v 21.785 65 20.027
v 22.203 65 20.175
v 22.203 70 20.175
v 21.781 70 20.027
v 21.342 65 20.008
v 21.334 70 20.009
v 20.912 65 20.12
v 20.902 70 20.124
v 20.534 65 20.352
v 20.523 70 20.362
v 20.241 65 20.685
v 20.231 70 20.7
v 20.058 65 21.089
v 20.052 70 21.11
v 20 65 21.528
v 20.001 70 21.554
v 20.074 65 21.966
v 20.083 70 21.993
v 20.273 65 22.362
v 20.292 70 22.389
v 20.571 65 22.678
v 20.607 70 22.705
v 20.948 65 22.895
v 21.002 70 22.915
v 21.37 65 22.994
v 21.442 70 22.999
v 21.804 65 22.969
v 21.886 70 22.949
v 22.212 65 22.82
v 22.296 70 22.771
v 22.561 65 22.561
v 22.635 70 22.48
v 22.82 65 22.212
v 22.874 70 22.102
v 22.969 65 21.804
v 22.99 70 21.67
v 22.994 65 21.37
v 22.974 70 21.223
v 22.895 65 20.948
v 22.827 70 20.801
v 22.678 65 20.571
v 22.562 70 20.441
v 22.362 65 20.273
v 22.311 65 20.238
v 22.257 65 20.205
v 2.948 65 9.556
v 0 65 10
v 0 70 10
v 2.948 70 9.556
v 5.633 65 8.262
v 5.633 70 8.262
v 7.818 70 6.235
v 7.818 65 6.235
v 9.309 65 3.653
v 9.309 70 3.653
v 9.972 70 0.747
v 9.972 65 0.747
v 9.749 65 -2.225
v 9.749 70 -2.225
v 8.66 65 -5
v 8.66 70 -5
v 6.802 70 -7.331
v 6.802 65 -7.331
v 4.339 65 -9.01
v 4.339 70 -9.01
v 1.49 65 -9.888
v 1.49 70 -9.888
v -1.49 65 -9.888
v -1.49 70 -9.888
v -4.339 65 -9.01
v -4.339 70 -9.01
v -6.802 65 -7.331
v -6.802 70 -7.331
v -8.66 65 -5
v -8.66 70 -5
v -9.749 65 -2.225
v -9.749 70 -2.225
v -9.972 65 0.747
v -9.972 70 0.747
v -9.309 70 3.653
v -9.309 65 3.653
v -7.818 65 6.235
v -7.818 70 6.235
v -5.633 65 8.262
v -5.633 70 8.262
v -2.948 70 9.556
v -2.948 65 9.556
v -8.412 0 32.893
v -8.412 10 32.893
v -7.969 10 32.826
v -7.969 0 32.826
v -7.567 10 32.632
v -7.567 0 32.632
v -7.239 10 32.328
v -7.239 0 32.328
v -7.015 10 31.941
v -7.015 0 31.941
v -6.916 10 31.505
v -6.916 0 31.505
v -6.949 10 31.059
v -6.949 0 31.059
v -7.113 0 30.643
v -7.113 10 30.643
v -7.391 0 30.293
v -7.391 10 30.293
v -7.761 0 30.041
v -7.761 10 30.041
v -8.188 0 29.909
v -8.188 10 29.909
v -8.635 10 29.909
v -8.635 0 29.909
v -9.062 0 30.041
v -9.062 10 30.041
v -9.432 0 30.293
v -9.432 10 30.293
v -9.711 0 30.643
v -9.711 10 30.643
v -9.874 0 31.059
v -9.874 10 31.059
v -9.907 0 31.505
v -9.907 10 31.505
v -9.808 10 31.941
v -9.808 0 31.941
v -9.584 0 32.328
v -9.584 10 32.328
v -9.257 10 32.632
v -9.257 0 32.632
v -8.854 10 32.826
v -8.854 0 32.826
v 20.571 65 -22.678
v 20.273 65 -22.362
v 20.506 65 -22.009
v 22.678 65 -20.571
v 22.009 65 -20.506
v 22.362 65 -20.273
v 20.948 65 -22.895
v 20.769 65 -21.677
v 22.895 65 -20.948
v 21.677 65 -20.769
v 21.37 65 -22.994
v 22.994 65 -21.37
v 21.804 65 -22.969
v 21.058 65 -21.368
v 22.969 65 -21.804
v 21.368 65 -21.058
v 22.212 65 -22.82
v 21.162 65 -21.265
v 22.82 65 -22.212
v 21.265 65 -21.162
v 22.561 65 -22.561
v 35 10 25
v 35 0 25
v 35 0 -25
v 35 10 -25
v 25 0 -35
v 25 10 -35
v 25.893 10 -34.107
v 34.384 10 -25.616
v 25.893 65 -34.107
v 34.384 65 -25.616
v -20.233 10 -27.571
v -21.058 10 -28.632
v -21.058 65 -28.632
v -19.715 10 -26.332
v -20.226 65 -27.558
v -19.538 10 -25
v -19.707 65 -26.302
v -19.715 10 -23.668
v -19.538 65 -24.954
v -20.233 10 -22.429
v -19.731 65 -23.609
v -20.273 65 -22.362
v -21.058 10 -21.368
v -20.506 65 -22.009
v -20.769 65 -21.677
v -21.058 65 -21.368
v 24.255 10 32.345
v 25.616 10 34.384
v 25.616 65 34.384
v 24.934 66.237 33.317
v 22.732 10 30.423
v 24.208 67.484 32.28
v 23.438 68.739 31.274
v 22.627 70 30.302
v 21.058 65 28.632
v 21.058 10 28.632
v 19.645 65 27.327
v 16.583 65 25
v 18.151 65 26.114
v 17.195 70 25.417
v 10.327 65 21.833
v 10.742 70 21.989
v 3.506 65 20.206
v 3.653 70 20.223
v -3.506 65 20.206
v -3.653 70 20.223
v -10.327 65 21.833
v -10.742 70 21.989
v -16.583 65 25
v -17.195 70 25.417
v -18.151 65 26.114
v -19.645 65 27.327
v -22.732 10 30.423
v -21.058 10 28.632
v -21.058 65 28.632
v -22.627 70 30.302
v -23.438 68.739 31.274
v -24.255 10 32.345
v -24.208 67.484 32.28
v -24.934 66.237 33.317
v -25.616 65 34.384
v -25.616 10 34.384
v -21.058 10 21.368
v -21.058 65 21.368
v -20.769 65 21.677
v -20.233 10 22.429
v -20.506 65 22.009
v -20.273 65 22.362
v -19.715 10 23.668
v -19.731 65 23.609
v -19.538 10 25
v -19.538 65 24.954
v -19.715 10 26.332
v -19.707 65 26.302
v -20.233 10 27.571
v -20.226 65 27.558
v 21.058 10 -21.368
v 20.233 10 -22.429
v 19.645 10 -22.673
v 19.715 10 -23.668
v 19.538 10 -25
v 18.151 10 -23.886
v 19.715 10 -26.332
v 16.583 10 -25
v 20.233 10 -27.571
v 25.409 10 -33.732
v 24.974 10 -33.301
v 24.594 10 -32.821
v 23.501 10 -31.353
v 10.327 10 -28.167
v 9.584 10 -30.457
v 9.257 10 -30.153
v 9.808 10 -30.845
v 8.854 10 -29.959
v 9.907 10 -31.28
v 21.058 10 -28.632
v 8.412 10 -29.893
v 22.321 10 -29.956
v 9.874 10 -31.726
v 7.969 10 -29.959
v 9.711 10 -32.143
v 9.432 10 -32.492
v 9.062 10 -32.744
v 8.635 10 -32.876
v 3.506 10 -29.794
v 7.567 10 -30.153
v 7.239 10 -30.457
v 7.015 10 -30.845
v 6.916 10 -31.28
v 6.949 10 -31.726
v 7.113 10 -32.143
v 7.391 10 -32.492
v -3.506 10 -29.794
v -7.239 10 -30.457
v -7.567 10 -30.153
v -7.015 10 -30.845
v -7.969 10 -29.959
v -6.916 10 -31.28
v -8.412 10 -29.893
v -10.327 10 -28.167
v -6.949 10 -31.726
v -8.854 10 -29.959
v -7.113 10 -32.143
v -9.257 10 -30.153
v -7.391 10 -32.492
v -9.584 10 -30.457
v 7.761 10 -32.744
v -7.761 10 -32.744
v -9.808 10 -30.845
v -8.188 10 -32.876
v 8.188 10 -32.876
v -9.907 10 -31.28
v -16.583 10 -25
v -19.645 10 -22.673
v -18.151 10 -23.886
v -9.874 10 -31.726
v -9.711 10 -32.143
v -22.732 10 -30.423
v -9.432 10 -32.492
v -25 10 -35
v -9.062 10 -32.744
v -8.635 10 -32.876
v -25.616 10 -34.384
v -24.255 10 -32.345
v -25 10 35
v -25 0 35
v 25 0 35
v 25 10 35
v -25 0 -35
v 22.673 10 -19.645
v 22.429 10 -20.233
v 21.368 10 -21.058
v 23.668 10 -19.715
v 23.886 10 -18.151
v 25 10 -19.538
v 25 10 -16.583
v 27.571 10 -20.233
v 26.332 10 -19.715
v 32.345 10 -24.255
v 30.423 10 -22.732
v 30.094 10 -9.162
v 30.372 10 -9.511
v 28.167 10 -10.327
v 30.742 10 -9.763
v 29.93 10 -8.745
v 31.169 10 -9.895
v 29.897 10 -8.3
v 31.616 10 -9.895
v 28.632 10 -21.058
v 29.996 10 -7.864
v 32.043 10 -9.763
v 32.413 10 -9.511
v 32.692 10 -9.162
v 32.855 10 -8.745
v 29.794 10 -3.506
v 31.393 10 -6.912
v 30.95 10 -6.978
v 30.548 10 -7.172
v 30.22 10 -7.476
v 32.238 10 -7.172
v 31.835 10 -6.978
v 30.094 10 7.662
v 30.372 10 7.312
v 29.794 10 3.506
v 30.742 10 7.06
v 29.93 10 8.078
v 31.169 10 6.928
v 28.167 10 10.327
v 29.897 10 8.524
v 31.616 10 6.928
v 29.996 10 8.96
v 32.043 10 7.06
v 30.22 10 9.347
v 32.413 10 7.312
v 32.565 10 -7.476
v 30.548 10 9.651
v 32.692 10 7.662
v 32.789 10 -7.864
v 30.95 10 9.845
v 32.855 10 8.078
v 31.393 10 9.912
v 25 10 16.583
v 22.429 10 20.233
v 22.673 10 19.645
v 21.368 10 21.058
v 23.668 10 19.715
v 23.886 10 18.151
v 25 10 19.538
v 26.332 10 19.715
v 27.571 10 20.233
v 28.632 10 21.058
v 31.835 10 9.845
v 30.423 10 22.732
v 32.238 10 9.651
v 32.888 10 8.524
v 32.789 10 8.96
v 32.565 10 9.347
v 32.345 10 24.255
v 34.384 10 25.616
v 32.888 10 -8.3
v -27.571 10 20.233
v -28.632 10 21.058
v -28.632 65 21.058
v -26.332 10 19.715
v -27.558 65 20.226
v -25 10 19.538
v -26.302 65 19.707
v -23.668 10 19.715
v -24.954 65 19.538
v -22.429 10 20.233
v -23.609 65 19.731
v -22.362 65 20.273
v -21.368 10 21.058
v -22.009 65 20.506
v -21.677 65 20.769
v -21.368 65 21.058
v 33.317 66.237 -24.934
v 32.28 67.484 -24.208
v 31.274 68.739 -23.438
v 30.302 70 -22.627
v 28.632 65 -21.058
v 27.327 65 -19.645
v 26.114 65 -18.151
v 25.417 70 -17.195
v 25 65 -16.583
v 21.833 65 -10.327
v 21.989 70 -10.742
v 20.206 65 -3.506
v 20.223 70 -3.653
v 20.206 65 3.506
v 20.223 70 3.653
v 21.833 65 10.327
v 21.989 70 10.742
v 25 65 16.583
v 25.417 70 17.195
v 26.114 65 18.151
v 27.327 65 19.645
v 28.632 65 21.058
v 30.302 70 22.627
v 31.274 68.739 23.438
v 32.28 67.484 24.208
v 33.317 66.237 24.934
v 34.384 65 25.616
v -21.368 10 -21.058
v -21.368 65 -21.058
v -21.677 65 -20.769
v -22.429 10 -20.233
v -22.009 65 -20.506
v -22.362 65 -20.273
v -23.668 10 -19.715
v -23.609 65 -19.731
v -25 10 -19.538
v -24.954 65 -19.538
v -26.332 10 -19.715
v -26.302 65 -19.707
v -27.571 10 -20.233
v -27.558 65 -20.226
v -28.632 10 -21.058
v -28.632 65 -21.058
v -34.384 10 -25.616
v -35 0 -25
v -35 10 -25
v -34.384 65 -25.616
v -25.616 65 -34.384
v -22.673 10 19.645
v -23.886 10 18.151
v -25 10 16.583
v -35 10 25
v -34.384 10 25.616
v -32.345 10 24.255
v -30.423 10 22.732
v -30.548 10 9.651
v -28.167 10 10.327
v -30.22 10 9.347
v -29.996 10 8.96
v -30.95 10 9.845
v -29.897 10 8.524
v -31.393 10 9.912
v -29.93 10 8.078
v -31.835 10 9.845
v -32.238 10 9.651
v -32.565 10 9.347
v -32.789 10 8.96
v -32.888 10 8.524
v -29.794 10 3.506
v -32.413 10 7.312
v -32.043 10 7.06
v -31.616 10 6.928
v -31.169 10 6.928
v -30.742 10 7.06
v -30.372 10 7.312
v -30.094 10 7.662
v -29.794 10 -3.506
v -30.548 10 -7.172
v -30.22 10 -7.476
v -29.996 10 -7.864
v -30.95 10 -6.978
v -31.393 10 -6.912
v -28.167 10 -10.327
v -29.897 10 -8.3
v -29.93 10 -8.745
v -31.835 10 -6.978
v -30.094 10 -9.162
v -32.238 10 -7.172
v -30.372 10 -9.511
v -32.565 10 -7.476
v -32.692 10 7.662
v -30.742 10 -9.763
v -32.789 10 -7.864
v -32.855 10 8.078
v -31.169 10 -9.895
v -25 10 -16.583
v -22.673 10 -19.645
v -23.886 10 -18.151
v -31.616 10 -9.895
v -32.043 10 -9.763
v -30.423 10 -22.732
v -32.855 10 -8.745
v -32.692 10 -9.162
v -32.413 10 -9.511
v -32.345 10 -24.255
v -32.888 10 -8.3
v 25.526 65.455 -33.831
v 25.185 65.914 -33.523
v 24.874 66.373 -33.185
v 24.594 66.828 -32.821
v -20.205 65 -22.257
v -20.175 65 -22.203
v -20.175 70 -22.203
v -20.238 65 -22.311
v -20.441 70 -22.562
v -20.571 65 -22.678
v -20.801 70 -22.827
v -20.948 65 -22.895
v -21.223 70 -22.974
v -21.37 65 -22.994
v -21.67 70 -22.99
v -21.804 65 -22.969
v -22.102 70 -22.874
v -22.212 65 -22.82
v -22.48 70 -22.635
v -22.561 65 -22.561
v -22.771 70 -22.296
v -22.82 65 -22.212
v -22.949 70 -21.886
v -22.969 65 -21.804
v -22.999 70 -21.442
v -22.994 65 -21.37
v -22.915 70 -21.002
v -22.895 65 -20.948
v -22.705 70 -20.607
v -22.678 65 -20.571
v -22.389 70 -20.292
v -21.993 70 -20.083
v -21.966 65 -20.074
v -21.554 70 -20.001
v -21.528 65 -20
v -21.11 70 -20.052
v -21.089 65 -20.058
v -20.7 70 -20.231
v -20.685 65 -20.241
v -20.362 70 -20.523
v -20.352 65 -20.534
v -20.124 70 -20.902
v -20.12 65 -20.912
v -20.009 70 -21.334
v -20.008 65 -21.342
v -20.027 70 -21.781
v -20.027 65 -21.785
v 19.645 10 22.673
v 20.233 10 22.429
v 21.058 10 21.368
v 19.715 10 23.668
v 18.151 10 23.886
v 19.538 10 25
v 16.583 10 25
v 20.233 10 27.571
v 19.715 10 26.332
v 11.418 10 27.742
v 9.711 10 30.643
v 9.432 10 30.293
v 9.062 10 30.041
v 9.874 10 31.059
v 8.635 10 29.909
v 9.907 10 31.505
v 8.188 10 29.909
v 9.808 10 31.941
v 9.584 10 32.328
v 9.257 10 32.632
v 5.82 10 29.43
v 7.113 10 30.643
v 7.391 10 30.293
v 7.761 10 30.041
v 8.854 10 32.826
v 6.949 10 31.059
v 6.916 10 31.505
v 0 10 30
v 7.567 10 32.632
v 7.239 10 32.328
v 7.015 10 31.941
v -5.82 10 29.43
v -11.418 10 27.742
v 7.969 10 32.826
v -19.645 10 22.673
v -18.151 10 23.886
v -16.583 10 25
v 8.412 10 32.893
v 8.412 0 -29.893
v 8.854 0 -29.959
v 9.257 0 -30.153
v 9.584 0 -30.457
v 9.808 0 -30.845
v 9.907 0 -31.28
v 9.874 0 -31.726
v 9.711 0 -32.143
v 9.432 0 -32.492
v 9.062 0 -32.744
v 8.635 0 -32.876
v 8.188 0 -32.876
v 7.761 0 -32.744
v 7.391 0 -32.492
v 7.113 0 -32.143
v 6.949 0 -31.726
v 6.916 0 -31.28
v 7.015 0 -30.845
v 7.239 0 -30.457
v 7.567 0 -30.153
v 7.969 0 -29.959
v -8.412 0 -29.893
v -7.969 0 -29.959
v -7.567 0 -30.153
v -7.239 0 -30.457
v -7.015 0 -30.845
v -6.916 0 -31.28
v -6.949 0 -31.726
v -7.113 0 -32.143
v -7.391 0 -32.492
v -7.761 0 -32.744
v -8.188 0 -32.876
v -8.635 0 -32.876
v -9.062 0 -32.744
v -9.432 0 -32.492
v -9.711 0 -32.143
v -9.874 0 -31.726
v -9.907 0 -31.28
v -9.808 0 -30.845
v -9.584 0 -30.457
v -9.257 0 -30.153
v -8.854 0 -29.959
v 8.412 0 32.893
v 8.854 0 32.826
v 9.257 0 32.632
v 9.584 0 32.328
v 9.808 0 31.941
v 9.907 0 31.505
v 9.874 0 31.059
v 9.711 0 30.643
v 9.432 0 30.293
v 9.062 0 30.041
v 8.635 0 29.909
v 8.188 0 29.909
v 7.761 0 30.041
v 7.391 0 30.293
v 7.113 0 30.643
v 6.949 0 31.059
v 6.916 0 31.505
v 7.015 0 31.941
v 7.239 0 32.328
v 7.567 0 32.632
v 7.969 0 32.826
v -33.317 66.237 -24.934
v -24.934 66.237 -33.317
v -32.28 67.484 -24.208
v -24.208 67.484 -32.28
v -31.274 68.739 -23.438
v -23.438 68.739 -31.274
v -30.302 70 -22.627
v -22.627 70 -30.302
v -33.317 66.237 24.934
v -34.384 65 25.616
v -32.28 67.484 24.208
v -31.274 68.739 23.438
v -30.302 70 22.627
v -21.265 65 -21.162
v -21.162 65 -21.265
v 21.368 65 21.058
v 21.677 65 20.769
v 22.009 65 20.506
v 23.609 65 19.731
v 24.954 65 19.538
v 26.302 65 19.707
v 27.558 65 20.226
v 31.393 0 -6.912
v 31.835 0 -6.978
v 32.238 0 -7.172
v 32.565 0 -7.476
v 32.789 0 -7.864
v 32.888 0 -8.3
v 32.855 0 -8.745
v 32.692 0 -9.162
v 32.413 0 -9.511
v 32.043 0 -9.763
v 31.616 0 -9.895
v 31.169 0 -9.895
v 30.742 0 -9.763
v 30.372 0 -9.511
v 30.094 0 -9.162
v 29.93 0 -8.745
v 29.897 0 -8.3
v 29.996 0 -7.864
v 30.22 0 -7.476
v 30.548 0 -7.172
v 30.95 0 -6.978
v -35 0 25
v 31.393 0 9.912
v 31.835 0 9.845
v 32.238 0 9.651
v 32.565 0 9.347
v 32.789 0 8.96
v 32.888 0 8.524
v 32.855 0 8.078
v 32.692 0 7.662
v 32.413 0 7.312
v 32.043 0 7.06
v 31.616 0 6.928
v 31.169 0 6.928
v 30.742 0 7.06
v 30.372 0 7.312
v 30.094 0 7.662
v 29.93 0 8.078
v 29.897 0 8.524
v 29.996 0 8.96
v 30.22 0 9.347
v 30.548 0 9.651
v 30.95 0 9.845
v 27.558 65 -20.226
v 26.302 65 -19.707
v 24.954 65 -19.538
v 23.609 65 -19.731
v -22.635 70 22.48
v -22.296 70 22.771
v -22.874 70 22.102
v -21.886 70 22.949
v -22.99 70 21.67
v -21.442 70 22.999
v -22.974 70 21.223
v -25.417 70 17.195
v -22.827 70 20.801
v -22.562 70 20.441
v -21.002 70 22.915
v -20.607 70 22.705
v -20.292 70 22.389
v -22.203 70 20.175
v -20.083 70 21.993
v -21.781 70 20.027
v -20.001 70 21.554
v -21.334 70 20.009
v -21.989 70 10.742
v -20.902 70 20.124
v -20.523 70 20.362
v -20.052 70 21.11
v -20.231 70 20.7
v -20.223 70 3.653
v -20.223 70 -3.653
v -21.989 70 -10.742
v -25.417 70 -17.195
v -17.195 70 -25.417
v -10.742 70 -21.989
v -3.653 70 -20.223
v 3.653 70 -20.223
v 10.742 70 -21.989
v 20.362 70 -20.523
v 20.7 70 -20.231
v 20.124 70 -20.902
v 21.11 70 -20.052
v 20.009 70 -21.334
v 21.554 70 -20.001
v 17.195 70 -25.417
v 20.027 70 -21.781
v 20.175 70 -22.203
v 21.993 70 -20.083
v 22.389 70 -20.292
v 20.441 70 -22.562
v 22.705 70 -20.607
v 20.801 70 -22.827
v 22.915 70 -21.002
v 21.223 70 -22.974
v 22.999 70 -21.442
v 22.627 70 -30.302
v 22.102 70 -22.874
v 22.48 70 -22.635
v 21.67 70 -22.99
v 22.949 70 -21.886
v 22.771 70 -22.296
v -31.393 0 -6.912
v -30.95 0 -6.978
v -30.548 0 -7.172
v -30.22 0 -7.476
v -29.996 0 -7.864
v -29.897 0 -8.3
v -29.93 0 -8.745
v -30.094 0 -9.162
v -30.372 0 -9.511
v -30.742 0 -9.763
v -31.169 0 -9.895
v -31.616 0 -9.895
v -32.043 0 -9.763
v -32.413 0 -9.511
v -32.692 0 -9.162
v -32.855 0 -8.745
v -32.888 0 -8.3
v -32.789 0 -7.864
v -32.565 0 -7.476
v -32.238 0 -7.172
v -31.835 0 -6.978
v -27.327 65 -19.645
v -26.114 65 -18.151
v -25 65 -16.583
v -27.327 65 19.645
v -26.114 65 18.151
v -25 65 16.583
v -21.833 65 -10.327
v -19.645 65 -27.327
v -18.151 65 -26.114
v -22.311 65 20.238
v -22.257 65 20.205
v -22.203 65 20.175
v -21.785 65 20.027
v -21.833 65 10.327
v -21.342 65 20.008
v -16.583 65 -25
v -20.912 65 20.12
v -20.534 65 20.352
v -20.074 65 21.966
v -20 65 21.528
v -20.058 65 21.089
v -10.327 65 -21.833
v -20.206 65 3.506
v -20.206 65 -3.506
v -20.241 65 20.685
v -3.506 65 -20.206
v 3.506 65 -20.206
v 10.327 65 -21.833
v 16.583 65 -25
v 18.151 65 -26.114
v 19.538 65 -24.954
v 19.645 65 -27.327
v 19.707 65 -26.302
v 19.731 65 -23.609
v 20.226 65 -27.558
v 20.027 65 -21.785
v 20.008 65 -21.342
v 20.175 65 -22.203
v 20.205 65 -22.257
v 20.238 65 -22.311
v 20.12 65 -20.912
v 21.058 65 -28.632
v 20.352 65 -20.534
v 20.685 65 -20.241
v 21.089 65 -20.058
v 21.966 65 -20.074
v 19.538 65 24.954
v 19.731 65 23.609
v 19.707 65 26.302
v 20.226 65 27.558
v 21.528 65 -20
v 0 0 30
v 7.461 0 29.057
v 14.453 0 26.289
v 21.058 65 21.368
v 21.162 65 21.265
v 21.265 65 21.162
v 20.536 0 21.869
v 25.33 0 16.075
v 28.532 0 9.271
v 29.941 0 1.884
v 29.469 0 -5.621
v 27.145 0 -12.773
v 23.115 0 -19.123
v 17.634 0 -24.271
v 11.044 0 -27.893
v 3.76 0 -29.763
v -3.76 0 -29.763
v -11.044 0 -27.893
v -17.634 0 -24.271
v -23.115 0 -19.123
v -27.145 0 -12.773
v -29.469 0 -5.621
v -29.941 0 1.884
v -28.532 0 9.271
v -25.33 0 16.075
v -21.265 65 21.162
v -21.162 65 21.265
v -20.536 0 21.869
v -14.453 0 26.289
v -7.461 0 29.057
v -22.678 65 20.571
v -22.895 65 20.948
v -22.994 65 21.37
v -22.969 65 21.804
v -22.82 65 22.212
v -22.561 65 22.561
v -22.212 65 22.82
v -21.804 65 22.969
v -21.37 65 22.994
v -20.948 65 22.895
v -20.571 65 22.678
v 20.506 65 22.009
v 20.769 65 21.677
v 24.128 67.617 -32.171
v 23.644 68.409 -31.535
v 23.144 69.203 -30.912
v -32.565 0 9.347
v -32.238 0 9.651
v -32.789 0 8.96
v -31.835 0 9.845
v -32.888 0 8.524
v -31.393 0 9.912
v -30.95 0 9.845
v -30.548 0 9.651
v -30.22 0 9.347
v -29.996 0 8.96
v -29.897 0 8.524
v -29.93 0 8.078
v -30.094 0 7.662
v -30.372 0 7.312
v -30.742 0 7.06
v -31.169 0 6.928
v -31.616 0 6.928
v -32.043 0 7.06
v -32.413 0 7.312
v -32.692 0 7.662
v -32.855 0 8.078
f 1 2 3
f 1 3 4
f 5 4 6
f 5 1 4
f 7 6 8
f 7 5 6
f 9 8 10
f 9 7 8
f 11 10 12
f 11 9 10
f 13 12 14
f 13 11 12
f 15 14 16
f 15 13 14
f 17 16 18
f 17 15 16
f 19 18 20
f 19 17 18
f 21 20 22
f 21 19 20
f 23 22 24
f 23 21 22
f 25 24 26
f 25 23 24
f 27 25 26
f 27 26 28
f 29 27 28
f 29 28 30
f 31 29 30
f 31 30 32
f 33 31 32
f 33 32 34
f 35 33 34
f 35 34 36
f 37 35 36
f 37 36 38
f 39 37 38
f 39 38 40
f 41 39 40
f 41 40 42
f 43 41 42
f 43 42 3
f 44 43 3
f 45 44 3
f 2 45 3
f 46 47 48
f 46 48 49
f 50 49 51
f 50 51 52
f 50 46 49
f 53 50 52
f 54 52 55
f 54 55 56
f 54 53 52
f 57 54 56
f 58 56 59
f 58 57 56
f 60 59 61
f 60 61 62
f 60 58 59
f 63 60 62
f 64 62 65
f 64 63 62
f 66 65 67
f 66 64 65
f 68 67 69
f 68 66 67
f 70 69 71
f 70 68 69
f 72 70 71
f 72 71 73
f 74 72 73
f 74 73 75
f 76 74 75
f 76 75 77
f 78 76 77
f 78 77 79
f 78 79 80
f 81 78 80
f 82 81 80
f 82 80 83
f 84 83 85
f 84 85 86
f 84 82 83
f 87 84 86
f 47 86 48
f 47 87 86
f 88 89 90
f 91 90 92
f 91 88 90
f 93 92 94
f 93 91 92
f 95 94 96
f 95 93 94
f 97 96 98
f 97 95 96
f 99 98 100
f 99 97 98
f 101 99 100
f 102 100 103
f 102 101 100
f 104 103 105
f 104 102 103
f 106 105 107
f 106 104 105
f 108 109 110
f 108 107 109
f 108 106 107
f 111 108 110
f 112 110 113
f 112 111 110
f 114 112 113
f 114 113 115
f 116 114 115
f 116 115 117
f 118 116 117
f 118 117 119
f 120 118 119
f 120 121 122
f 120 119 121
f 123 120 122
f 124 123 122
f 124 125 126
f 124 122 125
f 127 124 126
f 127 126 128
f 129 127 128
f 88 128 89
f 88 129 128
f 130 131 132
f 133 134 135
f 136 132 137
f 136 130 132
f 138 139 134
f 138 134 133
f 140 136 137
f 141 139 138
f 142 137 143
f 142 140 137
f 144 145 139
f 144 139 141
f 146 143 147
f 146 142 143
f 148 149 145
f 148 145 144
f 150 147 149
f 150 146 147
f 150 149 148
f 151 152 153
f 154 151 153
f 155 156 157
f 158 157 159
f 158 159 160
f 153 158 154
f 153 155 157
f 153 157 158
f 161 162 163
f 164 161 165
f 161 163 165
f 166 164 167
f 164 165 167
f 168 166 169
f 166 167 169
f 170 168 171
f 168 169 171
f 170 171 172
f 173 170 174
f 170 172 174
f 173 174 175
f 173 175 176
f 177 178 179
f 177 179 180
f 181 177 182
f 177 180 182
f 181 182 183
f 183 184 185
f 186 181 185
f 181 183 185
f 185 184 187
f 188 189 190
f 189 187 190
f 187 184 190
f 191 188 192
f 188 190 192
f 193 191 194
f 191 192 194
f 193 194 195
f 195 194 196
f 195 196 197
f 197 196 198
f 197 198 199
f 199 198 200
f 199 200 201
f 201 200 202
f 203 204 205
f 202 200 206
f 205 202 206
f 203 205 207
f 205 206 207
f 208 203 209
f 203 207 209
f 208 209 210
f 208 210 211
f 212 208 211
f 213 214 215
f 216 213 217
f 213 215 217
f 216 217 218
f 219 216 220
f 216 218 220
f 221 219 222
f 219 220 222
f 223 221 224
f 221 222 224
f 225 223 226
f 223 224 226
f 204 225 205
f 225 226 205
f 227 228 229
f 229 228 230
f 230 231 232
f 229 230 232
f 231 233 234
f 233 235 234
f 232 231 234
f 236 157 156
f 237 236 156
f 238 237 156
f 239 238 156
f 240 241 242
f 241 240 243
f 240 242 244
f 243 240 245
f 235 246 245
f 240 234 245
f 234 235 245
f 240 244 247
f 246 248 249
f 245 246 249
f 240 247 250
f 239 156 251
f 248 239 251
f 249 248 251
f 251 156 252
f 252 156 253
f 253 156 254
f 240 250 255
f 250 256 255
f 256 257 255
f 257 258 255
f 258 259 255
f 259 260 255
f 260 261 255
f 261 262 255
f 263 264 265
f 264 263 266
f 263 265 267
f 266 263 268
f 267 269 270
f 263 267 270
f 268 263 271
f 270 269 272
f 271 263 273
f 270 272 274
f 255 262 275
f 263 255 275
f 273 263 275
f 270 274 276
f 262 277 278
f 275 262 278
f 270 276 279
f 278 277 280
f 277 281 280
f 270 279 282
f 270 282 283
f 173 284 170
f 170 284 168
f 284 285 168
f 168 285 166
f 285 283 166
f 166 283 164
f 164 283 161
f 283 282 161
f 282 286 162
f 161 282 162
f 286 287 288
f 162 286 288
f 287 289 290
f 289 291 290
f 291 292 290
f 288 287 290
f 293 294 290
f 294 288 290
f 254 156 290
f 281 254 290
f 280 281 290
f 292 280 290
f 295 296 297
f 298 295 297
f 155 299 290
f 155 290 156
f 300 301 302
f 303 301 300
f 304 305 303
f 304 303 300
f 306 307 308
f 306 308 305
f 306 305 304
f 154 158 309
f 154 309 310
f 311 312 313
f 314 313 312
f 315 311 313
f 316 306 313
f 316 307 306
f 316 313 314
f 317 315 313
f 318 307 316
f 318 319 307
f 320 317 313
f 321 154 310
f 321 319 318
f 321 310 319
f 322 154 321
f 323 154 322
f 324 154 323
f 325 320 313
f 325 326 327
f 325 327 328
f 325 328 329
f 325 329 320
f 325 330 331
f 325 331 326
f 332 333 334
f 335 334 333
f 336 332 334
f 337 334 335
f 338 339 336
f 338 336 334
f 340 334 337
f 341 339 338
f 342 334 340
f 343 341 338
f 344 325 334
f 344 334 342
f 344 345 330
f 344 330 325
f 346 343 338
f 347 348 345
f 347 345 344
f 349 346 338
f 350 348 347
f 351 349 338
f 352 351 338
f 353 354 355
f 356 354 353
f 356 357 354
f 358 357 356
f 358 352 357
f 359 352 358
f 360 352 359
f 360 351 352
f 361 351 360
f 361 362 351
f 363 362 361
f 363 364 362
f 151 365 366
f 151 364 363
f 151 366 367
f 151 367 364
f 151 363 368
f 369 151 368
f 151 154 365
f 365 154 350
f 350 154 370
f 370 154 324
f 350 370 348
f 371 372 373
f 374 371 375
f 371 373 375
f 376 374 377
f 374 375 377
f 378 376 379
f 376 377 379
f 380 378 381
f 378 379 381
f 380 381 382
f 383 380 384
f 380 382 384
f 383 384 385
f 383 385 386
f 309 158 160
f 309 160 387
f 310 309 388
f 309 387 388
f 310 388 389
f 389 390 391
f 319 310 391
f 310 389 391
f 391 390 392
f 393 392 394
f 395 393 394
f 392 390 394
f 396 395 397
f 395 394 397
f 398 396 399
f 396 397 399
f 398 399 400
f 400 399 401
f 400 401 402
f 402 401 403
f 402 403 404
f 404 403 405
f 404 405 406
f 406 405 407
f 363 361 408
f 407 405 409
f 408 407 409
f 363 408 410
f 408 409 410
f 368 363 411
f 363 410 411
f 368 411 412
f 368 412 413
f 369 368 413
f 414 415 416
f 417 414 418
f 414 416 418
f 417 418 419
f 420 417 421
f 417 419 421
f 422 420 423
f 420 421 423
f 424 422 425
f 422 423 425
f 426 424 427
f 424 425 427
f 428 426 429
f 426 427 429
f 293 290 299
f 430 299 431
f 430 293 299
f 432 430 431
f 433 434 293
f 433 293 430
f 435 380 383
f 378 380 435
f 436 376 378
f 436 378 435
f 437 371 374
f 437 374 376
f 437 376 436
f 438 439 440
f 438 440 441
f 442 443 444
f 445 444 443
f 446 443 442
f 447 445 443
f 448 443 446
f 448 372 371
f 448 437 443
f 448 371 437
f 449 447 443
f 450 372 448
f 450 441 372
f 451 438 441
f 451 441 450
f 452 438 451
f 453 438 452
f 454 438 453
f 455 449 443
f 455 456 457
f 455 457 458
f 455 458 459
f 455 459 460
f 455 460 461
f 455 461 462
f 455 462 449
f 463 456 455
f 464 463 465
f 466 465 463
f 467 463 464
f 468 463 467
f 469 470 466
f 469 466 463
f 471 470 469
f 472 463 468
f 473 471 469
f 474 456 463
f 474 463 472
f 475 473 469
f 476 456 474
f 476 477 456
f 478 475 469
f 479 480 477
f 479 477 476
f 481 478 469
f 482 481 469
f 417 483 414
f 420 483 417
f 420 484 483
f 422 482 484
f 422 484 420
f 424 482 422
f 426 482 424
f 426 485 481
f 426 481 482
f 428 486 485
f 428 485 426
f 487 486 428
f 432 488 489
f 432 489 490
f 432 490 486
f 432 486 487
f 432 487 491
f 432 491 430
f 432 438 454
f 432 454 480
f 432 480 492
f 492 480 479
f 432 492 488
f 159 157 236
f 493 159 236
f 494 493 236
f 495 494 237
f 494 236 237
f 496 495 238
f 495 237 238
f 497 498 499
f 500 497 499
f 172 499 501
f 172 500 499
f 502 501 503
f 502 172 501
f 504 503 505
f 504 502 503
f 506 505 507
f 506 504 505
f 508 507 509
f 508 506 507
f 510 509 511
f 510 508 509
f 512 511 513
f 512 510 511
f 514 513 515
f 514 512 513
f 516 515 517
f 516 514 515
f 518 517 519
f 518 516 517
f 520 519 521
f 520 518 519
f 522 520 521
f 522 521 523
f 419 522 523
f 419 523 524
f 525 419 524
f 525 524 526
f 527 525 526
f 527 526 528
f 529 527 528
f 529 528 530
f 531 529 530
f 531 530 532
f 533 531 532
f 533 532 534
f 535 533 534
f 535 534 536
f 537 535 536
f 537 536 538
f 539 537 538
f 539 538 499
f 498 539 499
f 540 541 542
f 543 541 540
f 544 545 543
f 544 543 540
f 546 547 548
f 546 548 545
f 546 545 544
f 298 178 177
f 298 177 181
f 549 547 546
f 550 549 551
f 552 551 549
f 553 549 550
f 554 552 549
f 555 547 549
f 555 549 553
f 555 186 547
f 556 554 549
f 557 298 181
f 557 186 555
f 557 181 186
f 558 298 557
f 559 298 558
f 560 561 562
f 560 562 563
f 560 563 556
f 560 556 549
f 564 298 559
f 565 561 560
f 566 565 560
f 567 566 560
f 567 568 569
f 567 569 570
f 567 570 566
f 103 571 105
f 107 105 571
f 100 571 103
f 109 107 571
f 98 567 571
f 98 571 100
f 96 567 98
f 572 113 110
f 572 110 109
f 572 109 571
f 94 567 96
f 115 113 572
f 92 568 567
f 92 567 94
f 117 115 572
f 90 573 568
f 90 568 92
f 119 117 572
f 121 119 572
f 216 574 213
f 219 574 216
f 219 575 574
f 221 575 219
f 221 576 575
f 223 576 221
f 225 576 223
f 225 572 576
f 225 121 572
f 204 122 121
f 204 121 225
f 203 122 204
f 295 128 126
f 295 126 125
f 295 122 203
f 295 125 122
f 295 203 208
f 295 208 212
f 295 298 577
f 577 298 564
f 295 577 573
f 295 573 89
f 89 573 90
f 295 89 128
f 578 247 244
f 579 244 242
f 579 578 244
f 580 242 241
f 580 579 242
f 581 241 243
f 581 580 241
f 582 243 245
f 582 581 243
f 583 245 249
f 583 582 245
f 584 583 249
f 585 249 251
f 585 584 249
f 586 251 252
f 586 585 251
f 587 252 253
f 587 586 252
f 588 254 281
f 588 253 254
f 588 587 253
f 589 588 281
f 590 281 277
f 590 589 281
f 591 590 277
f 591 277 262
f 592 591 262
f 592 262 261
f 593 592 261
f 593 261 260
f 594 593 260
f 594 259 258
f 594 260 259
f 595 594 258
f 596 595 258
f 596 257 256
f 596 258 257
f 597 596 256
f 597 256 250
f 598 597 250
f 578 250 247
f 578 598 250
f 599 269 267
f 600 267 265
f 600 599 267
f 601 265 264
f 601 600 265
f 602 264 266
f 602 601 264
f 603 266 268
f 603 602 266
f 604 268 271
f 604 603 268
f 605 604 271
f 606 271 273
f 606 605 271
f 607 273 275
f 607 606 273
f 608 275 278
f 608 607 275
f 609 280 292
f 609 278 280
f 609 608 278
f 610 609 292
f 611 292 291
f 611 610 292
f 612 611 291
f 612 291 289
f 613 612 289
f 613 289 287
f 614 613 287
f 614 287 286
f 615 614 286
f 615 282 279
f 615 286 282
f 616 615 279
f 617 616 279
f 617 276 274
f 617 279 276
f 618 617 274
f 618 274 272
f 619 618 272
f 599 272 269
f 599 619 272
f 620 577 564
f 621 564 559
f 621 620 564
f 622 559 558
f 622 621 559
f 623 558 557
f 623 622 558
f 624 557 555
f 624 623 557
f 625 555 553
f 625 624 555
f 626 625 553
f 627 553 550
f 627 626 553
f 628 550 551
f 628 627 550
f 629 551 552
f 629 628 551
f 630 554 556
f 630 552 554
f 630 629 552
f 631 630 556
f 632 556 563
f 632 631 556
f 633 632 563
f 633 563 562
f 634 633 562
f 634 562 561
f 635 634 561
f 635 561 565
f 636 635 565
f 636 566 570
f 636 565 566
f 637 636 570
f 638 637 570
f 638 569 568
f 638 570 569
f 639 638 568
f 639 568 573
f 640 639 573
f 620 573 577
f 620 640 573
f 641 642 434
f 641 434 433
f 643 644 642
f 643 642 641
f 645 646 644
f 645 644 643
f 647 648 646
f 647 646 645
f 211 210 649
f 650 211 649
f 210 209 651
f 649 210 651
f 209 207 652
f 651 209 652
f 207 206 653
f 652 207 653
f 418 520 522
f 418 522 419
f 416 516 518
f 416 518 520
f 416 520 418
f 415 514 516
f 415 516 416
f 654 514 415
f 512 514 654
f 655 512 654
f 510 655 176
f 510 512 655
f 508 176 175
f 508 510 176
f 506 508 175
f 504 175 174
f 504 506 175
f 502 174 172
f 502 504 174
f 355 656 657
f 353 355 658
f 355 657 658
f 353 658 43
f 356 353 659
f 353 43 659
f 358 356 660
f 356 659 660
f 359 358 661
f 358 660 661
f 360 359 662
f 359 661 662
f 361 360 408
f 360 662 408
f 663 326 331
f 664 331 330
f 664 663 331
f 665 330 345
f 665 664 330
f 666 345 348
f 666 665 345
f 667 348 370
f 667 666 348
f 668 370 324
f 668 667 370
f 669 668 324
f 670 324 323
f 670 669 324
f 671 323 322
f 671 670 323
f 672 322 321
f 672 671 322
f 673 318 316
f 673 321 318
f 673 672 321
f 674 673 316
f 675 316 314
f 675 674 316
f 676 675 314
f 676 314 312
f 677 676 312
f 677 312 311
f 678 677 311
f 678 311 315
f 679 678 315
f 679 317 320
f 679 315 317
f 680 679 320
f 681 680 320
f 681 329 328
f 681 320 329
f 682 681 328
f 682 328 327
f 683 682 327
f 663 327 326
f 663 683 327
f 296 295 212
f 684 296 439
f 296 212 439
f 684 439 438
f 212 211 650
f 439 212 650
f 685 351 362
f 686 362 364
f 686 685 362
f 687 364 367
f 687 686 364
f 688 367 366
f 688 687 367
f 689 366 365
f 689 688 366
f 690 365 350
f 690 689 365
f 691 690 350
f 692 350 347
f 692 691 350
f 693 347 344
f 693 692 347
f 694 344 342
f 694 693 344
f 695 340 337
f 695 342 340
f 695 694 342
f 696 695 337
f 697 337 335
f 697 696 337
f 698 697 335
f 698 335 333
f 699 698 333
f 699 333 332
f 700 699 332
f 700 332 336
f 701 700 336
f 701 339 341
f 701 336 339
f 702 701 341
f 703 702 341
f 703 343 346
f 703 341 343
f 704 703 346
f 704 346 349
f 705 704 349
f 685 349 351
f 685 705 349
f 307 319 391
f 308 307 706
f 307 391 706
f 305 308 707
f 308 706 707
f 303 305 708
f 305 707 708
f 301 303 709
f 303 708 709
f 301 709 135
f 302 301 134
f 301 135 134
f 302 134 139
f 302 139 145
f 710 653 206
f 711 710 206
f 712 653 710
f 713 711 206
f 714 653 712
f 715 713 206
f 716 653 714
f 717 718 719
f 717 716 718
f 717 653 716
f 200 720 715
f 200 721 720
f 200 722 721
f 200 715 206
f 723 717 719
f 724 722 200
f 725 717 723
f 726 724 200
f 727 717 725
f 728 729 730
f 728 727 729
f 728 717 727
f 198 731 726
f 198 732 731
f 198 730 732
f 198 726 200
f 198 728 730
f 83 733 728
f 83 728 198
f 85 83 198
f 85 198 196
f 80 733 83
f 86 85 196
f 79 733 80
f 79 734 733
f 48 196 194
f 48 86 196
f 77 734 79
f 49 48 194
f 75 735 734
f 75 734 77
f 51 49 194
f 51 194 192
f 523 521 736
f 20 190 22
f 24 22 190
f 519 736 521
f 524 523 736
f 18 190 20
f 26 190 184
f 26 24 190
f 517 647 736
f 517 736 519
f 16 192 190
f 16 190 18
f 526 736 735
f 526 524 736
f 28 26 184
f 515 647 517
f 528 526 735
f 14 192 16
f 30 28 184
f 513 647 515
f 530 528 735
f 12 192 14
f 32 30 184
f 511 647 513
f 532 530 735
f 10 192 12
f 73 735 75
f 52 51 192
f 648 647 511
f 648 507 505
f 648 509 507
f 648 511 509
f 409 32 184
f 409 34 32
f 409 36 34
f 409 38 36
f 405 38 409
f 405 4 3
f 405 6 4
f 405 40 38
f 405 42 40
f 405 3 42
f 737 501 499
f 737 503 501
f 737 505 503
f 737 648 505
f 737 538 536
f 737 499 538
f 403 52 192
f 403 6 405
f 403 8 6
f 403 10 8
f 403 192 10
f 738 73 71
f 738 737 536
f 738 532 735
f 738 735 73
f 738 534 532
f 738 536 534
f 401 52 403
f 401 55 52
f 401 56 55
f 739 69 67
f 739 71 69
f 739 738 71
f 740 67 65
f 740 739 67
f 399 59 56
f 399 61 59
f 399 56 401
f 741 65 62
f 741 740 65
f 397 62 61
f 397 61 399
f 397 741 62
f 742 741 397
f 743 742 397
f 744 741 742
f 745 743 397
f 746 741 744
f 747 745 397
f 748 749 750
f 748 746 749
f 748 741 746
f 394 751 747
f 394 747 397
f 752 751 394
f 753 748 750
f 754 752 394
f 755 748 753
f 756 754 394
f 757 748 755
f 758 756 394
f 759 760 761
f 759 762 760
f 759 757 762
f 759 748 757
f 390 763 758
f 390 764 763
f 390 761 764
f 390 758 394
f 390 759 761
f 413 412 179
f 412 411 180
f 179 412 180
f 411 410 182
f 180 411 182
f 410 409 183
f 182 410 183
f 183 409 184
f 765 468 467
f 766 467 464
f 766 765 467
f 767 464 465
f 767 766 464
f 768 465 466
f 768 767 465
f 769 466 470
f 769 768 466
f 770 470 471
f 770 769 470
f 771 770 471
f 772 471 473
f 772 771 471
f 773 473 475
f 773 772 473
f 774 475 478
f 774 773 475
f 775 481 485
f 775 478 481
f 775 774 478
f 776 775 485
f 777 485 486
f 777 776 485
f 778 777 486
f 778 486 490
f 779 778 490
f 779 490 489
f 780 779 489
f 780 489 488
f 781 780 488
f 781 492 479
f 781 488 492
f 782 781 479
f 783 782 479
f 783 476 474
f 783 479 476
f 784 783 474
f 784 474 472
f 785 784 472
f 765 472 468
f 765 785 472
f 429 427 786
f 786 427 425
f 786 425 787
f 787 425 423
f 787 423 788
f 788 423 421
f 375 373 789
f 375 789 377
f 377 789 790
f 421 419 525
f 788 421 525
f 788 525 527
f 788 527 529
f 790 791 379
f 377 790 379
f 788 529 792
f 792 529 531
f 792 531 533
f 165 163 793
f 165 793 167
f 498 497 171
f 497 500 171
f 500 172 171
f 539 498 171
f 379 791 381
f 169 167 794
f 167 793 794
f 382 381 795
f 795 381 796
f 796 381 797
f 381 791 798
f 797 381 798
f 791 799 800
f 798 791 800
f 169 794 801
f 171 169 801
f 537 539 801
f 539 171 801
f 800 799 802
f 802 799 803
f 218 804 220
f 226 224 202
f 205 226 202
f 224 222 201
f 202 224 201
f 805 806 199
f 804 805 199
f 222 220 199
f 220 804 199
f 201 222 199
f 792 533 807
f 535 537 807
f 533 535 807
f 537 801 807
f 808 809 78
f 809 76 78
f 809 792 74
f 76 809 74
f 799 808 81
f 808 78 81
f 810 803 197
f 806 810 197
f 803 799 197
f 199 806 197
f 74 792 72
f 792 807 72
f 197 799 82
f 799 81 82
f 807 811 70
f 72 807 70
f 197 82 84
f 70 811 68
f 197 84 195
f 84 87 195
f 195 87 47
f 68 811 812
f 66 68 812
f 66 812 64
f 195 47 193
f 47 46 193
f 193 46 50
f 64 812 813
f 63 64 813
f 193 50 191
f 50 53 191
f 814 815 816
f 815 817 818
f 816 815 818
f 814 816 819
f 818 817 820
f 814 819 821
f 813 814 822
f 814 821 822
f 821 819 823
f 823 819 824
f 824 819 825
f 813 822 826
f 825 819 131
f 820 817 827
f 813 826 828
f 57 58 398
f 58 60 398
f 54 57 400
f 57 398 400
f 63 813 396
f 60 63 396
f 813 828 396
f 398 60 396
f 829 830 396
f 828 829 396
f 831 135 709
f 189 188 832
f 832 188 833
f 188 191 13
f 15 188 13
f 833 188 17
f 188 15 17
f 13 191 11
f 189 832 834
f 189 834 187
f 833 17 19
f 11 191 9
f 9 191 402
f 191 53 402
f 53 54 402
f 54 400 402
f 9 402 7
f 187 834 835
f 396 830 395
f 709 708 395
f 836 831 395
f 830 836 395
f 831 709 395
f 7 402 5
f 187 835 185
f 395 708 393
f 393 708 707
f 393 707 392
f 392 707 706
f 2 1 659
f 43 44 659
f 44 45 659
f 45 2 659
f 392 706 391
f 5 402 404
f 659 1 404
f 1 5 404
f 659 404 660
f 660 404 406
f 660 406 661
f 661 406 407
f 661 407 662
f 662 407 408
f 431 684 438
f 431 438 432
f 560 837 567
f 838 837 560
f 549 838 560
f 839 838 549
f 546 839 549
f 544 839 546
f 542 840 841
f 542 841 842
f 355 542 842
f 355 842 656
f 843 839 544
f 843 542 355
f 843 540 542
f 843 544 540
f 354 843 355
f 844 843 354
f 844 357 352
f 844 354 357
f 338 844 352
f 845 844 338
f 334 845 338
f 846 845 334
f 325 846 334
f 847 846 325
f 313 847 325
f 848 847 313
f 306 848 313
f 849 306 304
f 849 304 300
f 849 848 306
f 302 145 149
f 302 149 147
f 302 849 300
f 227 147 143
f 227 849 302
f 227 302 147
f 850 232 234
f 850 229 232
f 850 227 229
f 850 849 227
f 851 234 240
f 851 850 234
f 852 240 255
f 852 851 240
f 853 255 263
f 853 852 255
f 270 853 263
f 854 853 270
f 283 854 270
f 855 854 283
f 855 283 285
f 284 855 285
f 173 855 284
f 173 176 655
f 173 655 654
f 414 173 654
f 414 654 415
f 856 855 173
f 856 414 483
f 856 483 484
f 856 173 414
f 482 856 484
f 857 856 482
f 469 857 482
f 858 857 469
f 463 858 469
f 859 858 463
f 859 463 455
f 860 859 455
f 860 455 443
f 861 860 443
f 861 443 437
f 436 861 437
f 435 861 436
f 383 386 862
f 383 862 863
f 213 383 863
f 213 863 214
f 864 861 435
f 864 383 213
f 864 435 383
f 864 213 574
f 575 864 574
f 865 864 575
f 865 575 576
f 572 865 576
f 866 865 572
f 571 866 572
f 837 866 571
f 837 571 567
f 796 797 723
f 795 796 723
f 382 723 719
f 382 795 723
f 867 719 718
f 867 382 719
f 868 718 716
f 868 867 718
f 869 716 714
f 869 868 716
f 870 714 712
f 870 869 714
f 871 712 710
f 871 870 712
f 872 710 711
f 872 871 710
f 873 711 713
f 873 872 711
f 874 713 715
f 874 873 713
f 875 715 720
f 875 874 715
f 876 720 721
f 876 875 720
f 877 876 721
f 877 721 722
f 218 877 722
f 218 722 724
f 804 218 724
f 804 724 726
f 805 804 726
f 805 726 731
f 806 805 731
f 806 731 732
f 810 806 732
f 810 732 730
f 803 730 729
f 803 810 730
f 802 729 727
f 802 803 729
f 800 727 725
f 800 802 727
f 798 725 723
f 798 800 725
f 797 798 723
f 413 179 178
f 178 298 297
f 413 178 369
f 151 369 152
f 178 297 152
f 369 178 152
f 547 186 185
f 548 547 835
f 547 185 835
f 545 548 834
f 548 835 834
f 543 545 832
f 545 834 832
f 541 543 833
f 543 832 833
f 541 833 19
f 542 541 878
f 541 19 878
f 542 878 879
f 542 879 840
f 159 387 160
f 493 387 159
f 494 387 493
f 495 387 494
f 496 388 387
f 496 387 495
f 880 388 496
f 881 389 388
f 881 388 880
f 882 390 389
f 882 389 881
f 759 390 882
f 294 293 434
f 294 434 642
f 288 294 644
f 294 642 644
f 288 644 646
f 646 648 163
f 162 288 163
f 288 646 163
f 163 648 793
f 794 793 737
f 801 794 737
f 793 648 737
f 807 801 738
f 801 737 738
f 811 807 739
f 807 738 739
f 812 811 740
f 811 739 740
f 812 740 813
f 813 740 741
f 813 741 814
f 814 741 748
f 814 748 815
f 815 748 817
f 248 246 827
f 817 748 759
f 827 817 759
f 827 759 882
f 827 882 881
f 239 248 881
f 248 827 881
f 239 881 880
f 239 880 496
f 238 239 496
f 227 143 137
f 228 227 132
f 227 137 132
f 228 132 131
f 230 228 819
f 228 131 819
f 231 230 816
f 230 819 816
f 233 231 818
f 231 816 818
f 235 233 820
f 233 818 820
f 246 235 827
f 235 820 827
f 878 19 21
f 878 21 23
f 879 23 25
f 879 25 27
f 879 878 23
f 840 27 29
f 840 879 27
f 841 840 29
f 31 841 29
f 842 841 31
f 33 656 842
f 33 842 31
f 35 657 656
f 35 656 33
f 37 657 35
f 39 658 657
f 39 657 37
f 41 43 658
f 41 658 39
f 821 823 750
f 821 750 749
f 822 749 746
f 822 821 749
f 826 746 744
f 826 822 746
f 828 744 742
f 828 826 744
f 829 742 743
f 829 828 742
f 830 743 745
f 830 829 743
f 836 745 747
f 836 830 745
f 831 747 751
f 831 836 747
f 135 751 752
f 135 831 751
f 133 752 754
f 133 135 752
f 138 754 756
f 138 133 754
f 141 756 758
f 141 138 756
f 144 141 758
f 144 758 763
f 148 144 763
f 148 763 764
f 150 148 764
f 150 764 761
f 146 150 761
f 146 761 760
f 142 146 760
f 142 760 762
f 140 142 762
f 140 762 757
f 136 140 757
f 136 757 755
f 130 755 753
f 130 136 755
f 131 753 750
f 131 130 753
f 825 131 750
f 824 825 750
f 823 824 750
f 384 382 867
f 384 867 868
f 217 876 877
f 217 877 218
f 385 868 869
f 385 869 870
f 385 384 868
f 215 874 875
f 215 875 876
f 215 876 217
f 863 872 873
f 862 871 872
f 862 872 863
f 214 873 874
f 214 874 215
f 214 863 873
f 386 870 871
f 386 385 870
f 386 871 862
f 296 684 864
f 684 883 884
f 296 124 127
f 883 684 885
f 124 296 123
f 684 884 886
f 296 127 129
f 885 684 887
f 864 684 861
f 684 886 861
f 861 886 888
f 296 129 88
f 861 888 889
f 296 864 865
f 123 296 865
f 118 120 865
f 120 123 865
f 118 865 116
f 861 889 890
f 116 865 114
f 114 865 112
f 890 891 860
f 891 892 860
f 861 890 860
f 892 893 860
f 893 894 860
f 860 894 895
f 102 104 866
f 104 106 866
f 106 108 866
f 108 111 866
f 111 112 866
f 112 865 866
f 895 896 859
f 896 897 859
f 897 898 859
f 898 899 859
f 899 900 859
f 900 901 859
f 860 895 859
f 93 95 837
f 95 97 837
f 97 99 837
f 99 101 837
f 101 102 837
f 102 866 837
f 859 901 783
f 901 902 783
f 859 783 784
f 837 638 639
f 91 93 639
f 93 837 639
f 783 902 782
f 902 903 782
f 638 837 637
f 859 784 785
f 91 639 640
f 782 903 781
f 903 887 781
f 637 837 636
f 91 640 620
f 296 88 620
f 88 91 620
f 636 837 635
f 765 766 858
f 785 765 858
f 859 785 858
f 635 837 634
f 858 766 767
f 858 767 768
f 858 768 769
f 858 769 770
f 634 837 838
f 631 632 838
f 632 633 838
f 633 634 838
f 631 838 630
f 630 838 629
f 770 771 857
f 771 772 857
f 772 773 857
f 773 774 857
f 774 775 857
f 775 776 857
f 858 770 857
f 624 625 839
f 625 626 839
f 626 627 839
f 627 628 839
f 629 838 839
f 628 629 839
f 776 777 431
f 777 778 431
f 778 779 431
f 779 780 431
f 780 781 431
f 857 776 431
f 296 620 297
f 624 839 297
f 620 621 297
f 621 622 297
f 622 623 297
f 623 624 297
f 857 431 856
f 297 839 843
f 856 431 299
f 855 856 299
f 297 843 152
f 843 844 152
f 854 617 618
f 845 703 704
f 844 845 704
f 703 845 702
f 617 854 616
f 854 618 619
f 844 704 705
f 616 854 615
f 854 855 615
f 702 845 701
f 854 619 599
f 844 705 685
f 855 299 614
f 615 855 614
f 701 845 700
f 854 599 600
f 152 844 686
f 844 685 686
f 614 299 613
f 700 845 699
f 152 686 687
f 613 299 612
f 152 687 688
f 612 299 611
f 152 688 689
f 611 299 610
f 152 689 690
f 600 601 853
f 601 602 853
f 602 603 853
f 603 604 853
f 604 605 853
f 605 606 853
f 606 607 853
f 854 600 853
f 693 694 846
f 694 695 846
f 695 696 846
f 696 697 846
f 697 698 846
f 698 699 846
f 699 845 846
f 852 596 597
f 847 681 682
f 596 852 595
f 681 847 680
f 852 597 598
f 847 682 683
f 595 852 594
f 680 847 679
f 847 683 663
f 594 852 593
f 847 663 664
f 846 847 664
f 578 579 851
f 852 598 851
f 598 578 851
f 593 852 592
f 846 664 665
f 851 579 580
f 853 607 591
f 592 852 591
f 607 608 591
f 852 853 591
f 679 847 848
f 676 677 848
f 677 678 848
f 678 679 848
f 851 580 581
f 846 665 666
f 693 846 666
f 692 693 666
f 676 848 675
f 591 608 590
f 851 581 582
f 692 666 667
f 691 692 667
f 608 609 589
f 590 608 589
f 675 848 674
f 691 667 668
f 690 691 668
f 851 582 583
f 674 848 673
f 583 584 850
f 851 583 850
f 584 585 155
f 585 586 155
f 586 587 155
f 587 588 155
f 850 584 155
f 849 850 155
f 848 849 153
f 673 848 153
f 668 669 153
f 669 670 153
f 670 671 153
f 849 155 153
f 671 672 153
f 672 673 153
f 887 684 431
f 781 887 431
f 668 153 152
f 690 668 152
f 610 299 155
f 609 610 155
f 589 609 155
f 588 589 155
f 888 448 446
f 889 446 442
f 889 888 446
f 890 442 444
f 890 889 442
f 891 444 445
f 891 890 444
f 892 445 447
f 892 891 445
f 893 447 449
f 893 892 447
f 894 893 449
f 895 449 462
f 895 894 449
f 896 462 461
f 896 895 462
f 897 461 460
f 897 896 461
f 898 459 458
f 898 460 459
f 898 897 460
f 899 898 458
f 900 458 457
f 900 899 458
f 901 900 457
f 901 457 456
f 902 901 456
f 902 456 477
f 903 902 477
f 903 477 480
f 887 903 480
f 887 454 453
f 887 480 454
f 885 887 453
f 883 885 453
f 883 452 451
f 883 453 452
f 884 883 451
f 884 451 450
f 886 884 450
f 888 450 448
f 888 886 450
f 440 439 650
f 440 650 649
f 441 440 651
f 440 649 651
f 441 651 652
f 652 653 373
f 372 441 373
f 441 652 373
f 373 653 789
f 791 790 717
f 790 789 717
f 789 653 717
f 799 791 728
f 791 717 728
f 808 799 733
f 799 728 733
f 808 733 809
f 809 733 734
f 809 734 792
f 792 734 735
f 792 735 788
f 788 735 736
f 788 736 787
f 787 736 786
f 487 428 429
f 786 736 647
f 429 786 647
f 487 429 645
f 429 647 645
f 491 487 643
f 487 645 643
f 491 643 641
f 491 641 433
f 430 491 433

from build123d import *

# Parameters (mm, degrees)
SKETCH1_W           = 70
SKETCH1_H           = 70
SKETCH1_R           = 30
SKETCH1_R_2         = 1.5
BOSS_EXTRUDE1_DEPTH = 65
SKETCH2_W           = 70
SKETCH2_H           = 70
SKETCH2_R           = 1.5
SKETCH2_R_2         = 10
BOSS_EXTRUDE2_DEPTH = 5
SKETCH3_R           = 30
CUT_EXTRUDE1_DEPTH  = 60
CIRPATTERN1_COUNT   = 4
FILLET2_R           = 5.1
CHAMFER1_SIZE       = 10
CHAMFER2_SIZE       = 5


with BuildPart() as part:
    # Sketch1 → Boss-Extrude1 (new body)
    with BuildSketch(Plane(origin=(0, 0, 0), x_dir=(1, 0, 0), z_dir=(0, 1, 0))):
        Rectangle(SKETCH1_W, SKETCH1_H)
        with Locations(Location((0, 0, 0), (0, 0, 270))):
            Circle(SKETCH1_R, mode=Mode.SUBTRACT)
        with Locations(Location((-8.411618966, 31.392589354, 0), (0, 0, 270))):
            Circle(SKETCH1_R_2, mode=Mode.SUBTRACT)
        with Locations(Location((8.411618966, 31.392589354, 0), (0, 0, 270))):
            Circle(SKETCH1_R_2, mode=Mode.SUBTRACT)
        with Locations(Location((31.392589354, 8.411618966, 0), (0, 0, 270))):
            Circle(SKETCH1_R_2, mode=Mode.SUBTRACT)
        with Locations(Location((31.392589354, -8.411618966, 0), (0, 0, 270))):
            Circle(SKETCH1_R_2, mode=Mode.SUBTRACT)
        with Locations(Location((8.411618966, -31.392589354, 0), (0, 0, 270))):
            Circle(SKETCH1_R_2, mode=Mode.SUBTRACT)
        with Locations(Location((-8.411618966, -31.392589354, 0), (0, 0, 270))):
            Circle(SKETCH1_R_2, mode=Mode.SUBTRACT)
        with Locations(Location((-31.392589354, -8.411618966, 0), (0, 0, 270))):
            Circle(SKETCH1_R_2, mode=Mode.SUBTRACT)
        with Locations(Location((-31.392589354, 8.411618966, 0), (0, 0, 270))):
            Circle(SKETCH1_R_2, mode=Mode.SUBTRACT)
    extrude(amount=BOSS_EXTRUDE1_DEPTH)

    # Sketch2 → Boss-Extrude2 (add)
    with BuildSketch(Plane(origin=(0, 65, 0), x_dir=(1, 0, 0), z_dir=(0, 1, 0))):
        Rectangle(SKETCH2_W, SKETCH2_H)
        with Locations(Location((0, 32.5, 0), (0, 0, 270))):
            Circle(SKETCH2_R, mode=Mode.SUBTRACT)
        with Locations(Location((16.25, 28.145825623, 0), (0, 0, 270))):
            Circle(SKETCH2_R, mode=Mode.SUBTRACT)
        with Locations(Location((28.145825623, 16.25, 0), (0, 0, 270))):
            Circle(SKETCH2_R, mode=Mode.SUBTRACT)
        with Locations(Location((32.5, 0, 0), (0, 0, 270))):
            Circle(SKETCH2_R, mode=Mode.SUBTRACT)
        with Locations(Location((28.145825623, -16.25, 0), (0, 0, 270))):
            Circle(SKETCH2_R, mode=Mode.SUBTRACT)
        with Locations(Location((16.25, -28.145825623, 0), (0, 0, 270))):
            Circle(SKETCH2_R, mode=Mode.SUBTRACT)
        with Locations(Location((0, -32.5, 0), (0, 0, 270))):
            Circle(SKETCH2_R, mode=Mode.SUBTRACT)
        with Locations(Location((-16.25, -28.145825623, 0), (0, 0, 270))):
            Circle(SKETCH2_R, mode=Mode.SUBTRACT)
        with Locations(Location((-28.145825623, -16.25, 0), (0, 0, 270))):
            Circle(SKETCH2_R, mode=Mode.SUBTRACT)
        with Locations(Location((-32.5, 0, 0), (0, 0, 270))):
            Circle(SKETCH2_R, mode=Mode.SUBTRACT)
        with Locations(Location((-28.145825623, 16.25, 0), (0, 0, 270))):
            Circle(SKETCH2_R, mode=Mode.SUBTRACT)
        with Locations(Location((-16.25, 28.145825623, 0), (0, 0, 270))):
            Circle(SKETCH2_R, mode=Mode.SUBTRACT)
        with Locations(Location((0, 0, 0), (0, 0, 270))):
            Circle(SKETCH2_R_2, mode=Mode.SUBTRACT)
        with Locations(Location((-21.5, 21.5, 0), (0, 0, 27.946923368))):
            Circle(SKETCH2_R, mode=Mode.SUBTRACT)
        with Locations(Location((21.5, 21.5, 0), (0, 0, 152.053076632))):
            Circle(SKETCH2_R, mode=Mode.SUBTRACT)
        with Locations(Location((21.5, -21.5, 0), (0, 0, 62.053076632))):
            Circle(SKETCH2_R, mode=Mode.SUBTRACT)
        with Locations(Location((-21.5, -21.5, 0), (0, 0, 117.946923368))):
            Circle(SKETCH2_R, mode=Mode.SUBTRACT)
    extrude(amount=BOSS_EXTRUDE2_DEPTH)

    # Sketch3 → Cut-Extrude1 (cut)
    with BuildSketch(Plane(origin=(0, 70, 0), x_dir=(1, 0, 0), z_dir=(0, 1, 0))):
        with Locations((0, 50)):
            Circle(SKETCH3_R)
    cut_extrude1 = extrude(amount=-CUT_EXTRUDE1_DEPTH, mode=Mode.SUBTRACT)

    # CirPattern1: Cut-Extrude1 ×4 about axis
    cirpattern1_axis = Axis((0, 0, 0), (0, 1, 0))
    for i in range(1, CIRPATTERN1_COUNT):
        add(cut_extrude1.rotate(cirpattern1_axis, i * 360 / CIRPATTERN1_COUNT), mode=Mode.SUBTRACT)

    # Fillet2
    # the kernel refuses this fillet: 5.1 mm, written as the material it takes off along each edge
    with BuildSketch(Plane(origin=(25.980762114, 10, -35), x_dir=(1, 0, 0), z_dir=(0, 1, 0))) as fillet2_piece_1:
        with BuildLine():
            CenterArc((2.794227026, -5.1), FILLET2_R, 90, 55.064804049)
            ThreePointArc((-1.386754302, -2.179487179), (-0.669907143, -1.104676981), (0, 0))
            Line((0, 0), (2.794227026, 0))
        make_face()
    extrude(amount=66.985567566, mode=Mode.SUBTRACT)
    with BuildSketch(Plane(origin=(16.583123952, 65, -25), x_dir=(0.7763821649146441, 0, 0.6302624326440933), z_dir=(0, -1, 0)), Plane(origin=(16.583123952, 65, 25), x_dir=(0.776382164914642, 0, 0.6302624326440961), z_dir=(0, -1, 0)), Plane(origin=(25, 65, 16.583123952), x_dir=(-0.6302624326440963, 0, 0.7763821649146417), z_dir=(0, -1, 0)), Plane(origin=(-25, 65, 16.583123952), x_dir=(-0.630262432644093, 0, 0.7763821649146444), z_dir=(0, -1, 0))) as fillet2_piece_2:
        with BuildLine():
            CenterArc((6.253330537, -5.076416608), FILLET2_R, 95.512177233, 90.836671542)
            ThreePointArc((1.184608644, -5.640383249), (0.728068224, -2.79167812), (0, 0))
            ThreePointArc((0, 0), (2.881719141, -0.138725834), (5.763438283, 0))
        make_face()
    extrude(amount=55, mode=Mode.SUBTRACT)
    with BuildSketch(Plane(origin=(-16.583123952, 65, -25), x_dir=(-0.7763821649146441, 0, 0.6302624326440932), z_dir=(0, -1, 0)), Plane(origin=(-16.583123952, 65, 25), x_dir=(-0.7763821649146462, 0, 0.6302624326440908), z_dir=(0, -1, 0)), Plane(origin=(25, 65, -16.583123952), x_dir=(-0.6302624326440941, 0, -0.7763821649146434), z_dir=(0, -1, 0)), Plane(origin=(-25, 65, -16.583123952), x_dir=(-0.6302624326440903, 0, -0.7763821649146465), z_dir=(0, -1, 0))) as fillet2_piece_3:
        with BuildLine():
            CenterArc((6.253330537, 5.076416608), FILLET2_R, 173.651151224, 90.836671542)
            ThreePointArc((1.184608644, 5.640383249), (0.728068224, 2.79167812), (0, 0))
            ThreePointArc((0, 0), (2.881719141, 0.138725834), (5.763438283, 0))
        make_face()
    extrude(amount=55, mode=Mode.SUBTRACT)

    # Chamfer1
    # the kernel refuses this chamfer: 10 mm, written as the material it takes off along each edge
    with BuildSketch(Plane(origin=(35, -25.71682988, 35), x_dir=(-0.9996219169112968, 0, 0.027495876610586317), z_dir=(0, 1, 0)), Plane(origin=(-35, 95.71682988, 35), x_dir=(0.9996219169112968, 0, 0.027495876610586317), z_dir=(0, -1, 0))) as chamfer1_piece_1:
        Polygon((CHAMFER1_SIZE * 0.999621916911, -CHAMFER1_SIZE * 0.0274958766106), (-CHAMFER1_SIZE * 0.0274958766106, -CHAMFER1_SIZE * 0.999621916911), (0, 0), align=None)
    extrude(amount=121.433659759, mode=Mode.SUBTRACT)
    with BuildSketch(Plane(origin=(35, -25.71682988, -35), x_dir=(-0.9996219169112968, 0, -0.027495876610586317), z_dir=(0, 1, 0)), Plane(origin=(-35, 95.71682988, -35), x_dir=(0.9996219169112968, 0, -0.027495876610586317), z_dir=(0, -1, 0))) as chamfer1_piece_2:
        Polygon((CHAMFER1_SIZE * 0.999621916911, CHAMFER1_SIZE * 0.0274958766106), (-CHAMFER1_SIZE * 0.0274958766106, CHAMFER1_SIZE * 0.999621916911), (0, 0), align=None)
    extrude(amount=121.433659759, mode=Mode.SUBTRACT)

    # Chamfer2
    chamfer2_edges = [part.edges().sort_by_distance(p)[0] for p in [
        (-30, 70, 30),
        (30, 70, 30),
        (30.138549403, 70, -29.861450597),
        (-30, 70, -30),
    ]]
    chamfer(chamfer2_edges, length=CHAMFER2_SIZE)


solid = part.part
